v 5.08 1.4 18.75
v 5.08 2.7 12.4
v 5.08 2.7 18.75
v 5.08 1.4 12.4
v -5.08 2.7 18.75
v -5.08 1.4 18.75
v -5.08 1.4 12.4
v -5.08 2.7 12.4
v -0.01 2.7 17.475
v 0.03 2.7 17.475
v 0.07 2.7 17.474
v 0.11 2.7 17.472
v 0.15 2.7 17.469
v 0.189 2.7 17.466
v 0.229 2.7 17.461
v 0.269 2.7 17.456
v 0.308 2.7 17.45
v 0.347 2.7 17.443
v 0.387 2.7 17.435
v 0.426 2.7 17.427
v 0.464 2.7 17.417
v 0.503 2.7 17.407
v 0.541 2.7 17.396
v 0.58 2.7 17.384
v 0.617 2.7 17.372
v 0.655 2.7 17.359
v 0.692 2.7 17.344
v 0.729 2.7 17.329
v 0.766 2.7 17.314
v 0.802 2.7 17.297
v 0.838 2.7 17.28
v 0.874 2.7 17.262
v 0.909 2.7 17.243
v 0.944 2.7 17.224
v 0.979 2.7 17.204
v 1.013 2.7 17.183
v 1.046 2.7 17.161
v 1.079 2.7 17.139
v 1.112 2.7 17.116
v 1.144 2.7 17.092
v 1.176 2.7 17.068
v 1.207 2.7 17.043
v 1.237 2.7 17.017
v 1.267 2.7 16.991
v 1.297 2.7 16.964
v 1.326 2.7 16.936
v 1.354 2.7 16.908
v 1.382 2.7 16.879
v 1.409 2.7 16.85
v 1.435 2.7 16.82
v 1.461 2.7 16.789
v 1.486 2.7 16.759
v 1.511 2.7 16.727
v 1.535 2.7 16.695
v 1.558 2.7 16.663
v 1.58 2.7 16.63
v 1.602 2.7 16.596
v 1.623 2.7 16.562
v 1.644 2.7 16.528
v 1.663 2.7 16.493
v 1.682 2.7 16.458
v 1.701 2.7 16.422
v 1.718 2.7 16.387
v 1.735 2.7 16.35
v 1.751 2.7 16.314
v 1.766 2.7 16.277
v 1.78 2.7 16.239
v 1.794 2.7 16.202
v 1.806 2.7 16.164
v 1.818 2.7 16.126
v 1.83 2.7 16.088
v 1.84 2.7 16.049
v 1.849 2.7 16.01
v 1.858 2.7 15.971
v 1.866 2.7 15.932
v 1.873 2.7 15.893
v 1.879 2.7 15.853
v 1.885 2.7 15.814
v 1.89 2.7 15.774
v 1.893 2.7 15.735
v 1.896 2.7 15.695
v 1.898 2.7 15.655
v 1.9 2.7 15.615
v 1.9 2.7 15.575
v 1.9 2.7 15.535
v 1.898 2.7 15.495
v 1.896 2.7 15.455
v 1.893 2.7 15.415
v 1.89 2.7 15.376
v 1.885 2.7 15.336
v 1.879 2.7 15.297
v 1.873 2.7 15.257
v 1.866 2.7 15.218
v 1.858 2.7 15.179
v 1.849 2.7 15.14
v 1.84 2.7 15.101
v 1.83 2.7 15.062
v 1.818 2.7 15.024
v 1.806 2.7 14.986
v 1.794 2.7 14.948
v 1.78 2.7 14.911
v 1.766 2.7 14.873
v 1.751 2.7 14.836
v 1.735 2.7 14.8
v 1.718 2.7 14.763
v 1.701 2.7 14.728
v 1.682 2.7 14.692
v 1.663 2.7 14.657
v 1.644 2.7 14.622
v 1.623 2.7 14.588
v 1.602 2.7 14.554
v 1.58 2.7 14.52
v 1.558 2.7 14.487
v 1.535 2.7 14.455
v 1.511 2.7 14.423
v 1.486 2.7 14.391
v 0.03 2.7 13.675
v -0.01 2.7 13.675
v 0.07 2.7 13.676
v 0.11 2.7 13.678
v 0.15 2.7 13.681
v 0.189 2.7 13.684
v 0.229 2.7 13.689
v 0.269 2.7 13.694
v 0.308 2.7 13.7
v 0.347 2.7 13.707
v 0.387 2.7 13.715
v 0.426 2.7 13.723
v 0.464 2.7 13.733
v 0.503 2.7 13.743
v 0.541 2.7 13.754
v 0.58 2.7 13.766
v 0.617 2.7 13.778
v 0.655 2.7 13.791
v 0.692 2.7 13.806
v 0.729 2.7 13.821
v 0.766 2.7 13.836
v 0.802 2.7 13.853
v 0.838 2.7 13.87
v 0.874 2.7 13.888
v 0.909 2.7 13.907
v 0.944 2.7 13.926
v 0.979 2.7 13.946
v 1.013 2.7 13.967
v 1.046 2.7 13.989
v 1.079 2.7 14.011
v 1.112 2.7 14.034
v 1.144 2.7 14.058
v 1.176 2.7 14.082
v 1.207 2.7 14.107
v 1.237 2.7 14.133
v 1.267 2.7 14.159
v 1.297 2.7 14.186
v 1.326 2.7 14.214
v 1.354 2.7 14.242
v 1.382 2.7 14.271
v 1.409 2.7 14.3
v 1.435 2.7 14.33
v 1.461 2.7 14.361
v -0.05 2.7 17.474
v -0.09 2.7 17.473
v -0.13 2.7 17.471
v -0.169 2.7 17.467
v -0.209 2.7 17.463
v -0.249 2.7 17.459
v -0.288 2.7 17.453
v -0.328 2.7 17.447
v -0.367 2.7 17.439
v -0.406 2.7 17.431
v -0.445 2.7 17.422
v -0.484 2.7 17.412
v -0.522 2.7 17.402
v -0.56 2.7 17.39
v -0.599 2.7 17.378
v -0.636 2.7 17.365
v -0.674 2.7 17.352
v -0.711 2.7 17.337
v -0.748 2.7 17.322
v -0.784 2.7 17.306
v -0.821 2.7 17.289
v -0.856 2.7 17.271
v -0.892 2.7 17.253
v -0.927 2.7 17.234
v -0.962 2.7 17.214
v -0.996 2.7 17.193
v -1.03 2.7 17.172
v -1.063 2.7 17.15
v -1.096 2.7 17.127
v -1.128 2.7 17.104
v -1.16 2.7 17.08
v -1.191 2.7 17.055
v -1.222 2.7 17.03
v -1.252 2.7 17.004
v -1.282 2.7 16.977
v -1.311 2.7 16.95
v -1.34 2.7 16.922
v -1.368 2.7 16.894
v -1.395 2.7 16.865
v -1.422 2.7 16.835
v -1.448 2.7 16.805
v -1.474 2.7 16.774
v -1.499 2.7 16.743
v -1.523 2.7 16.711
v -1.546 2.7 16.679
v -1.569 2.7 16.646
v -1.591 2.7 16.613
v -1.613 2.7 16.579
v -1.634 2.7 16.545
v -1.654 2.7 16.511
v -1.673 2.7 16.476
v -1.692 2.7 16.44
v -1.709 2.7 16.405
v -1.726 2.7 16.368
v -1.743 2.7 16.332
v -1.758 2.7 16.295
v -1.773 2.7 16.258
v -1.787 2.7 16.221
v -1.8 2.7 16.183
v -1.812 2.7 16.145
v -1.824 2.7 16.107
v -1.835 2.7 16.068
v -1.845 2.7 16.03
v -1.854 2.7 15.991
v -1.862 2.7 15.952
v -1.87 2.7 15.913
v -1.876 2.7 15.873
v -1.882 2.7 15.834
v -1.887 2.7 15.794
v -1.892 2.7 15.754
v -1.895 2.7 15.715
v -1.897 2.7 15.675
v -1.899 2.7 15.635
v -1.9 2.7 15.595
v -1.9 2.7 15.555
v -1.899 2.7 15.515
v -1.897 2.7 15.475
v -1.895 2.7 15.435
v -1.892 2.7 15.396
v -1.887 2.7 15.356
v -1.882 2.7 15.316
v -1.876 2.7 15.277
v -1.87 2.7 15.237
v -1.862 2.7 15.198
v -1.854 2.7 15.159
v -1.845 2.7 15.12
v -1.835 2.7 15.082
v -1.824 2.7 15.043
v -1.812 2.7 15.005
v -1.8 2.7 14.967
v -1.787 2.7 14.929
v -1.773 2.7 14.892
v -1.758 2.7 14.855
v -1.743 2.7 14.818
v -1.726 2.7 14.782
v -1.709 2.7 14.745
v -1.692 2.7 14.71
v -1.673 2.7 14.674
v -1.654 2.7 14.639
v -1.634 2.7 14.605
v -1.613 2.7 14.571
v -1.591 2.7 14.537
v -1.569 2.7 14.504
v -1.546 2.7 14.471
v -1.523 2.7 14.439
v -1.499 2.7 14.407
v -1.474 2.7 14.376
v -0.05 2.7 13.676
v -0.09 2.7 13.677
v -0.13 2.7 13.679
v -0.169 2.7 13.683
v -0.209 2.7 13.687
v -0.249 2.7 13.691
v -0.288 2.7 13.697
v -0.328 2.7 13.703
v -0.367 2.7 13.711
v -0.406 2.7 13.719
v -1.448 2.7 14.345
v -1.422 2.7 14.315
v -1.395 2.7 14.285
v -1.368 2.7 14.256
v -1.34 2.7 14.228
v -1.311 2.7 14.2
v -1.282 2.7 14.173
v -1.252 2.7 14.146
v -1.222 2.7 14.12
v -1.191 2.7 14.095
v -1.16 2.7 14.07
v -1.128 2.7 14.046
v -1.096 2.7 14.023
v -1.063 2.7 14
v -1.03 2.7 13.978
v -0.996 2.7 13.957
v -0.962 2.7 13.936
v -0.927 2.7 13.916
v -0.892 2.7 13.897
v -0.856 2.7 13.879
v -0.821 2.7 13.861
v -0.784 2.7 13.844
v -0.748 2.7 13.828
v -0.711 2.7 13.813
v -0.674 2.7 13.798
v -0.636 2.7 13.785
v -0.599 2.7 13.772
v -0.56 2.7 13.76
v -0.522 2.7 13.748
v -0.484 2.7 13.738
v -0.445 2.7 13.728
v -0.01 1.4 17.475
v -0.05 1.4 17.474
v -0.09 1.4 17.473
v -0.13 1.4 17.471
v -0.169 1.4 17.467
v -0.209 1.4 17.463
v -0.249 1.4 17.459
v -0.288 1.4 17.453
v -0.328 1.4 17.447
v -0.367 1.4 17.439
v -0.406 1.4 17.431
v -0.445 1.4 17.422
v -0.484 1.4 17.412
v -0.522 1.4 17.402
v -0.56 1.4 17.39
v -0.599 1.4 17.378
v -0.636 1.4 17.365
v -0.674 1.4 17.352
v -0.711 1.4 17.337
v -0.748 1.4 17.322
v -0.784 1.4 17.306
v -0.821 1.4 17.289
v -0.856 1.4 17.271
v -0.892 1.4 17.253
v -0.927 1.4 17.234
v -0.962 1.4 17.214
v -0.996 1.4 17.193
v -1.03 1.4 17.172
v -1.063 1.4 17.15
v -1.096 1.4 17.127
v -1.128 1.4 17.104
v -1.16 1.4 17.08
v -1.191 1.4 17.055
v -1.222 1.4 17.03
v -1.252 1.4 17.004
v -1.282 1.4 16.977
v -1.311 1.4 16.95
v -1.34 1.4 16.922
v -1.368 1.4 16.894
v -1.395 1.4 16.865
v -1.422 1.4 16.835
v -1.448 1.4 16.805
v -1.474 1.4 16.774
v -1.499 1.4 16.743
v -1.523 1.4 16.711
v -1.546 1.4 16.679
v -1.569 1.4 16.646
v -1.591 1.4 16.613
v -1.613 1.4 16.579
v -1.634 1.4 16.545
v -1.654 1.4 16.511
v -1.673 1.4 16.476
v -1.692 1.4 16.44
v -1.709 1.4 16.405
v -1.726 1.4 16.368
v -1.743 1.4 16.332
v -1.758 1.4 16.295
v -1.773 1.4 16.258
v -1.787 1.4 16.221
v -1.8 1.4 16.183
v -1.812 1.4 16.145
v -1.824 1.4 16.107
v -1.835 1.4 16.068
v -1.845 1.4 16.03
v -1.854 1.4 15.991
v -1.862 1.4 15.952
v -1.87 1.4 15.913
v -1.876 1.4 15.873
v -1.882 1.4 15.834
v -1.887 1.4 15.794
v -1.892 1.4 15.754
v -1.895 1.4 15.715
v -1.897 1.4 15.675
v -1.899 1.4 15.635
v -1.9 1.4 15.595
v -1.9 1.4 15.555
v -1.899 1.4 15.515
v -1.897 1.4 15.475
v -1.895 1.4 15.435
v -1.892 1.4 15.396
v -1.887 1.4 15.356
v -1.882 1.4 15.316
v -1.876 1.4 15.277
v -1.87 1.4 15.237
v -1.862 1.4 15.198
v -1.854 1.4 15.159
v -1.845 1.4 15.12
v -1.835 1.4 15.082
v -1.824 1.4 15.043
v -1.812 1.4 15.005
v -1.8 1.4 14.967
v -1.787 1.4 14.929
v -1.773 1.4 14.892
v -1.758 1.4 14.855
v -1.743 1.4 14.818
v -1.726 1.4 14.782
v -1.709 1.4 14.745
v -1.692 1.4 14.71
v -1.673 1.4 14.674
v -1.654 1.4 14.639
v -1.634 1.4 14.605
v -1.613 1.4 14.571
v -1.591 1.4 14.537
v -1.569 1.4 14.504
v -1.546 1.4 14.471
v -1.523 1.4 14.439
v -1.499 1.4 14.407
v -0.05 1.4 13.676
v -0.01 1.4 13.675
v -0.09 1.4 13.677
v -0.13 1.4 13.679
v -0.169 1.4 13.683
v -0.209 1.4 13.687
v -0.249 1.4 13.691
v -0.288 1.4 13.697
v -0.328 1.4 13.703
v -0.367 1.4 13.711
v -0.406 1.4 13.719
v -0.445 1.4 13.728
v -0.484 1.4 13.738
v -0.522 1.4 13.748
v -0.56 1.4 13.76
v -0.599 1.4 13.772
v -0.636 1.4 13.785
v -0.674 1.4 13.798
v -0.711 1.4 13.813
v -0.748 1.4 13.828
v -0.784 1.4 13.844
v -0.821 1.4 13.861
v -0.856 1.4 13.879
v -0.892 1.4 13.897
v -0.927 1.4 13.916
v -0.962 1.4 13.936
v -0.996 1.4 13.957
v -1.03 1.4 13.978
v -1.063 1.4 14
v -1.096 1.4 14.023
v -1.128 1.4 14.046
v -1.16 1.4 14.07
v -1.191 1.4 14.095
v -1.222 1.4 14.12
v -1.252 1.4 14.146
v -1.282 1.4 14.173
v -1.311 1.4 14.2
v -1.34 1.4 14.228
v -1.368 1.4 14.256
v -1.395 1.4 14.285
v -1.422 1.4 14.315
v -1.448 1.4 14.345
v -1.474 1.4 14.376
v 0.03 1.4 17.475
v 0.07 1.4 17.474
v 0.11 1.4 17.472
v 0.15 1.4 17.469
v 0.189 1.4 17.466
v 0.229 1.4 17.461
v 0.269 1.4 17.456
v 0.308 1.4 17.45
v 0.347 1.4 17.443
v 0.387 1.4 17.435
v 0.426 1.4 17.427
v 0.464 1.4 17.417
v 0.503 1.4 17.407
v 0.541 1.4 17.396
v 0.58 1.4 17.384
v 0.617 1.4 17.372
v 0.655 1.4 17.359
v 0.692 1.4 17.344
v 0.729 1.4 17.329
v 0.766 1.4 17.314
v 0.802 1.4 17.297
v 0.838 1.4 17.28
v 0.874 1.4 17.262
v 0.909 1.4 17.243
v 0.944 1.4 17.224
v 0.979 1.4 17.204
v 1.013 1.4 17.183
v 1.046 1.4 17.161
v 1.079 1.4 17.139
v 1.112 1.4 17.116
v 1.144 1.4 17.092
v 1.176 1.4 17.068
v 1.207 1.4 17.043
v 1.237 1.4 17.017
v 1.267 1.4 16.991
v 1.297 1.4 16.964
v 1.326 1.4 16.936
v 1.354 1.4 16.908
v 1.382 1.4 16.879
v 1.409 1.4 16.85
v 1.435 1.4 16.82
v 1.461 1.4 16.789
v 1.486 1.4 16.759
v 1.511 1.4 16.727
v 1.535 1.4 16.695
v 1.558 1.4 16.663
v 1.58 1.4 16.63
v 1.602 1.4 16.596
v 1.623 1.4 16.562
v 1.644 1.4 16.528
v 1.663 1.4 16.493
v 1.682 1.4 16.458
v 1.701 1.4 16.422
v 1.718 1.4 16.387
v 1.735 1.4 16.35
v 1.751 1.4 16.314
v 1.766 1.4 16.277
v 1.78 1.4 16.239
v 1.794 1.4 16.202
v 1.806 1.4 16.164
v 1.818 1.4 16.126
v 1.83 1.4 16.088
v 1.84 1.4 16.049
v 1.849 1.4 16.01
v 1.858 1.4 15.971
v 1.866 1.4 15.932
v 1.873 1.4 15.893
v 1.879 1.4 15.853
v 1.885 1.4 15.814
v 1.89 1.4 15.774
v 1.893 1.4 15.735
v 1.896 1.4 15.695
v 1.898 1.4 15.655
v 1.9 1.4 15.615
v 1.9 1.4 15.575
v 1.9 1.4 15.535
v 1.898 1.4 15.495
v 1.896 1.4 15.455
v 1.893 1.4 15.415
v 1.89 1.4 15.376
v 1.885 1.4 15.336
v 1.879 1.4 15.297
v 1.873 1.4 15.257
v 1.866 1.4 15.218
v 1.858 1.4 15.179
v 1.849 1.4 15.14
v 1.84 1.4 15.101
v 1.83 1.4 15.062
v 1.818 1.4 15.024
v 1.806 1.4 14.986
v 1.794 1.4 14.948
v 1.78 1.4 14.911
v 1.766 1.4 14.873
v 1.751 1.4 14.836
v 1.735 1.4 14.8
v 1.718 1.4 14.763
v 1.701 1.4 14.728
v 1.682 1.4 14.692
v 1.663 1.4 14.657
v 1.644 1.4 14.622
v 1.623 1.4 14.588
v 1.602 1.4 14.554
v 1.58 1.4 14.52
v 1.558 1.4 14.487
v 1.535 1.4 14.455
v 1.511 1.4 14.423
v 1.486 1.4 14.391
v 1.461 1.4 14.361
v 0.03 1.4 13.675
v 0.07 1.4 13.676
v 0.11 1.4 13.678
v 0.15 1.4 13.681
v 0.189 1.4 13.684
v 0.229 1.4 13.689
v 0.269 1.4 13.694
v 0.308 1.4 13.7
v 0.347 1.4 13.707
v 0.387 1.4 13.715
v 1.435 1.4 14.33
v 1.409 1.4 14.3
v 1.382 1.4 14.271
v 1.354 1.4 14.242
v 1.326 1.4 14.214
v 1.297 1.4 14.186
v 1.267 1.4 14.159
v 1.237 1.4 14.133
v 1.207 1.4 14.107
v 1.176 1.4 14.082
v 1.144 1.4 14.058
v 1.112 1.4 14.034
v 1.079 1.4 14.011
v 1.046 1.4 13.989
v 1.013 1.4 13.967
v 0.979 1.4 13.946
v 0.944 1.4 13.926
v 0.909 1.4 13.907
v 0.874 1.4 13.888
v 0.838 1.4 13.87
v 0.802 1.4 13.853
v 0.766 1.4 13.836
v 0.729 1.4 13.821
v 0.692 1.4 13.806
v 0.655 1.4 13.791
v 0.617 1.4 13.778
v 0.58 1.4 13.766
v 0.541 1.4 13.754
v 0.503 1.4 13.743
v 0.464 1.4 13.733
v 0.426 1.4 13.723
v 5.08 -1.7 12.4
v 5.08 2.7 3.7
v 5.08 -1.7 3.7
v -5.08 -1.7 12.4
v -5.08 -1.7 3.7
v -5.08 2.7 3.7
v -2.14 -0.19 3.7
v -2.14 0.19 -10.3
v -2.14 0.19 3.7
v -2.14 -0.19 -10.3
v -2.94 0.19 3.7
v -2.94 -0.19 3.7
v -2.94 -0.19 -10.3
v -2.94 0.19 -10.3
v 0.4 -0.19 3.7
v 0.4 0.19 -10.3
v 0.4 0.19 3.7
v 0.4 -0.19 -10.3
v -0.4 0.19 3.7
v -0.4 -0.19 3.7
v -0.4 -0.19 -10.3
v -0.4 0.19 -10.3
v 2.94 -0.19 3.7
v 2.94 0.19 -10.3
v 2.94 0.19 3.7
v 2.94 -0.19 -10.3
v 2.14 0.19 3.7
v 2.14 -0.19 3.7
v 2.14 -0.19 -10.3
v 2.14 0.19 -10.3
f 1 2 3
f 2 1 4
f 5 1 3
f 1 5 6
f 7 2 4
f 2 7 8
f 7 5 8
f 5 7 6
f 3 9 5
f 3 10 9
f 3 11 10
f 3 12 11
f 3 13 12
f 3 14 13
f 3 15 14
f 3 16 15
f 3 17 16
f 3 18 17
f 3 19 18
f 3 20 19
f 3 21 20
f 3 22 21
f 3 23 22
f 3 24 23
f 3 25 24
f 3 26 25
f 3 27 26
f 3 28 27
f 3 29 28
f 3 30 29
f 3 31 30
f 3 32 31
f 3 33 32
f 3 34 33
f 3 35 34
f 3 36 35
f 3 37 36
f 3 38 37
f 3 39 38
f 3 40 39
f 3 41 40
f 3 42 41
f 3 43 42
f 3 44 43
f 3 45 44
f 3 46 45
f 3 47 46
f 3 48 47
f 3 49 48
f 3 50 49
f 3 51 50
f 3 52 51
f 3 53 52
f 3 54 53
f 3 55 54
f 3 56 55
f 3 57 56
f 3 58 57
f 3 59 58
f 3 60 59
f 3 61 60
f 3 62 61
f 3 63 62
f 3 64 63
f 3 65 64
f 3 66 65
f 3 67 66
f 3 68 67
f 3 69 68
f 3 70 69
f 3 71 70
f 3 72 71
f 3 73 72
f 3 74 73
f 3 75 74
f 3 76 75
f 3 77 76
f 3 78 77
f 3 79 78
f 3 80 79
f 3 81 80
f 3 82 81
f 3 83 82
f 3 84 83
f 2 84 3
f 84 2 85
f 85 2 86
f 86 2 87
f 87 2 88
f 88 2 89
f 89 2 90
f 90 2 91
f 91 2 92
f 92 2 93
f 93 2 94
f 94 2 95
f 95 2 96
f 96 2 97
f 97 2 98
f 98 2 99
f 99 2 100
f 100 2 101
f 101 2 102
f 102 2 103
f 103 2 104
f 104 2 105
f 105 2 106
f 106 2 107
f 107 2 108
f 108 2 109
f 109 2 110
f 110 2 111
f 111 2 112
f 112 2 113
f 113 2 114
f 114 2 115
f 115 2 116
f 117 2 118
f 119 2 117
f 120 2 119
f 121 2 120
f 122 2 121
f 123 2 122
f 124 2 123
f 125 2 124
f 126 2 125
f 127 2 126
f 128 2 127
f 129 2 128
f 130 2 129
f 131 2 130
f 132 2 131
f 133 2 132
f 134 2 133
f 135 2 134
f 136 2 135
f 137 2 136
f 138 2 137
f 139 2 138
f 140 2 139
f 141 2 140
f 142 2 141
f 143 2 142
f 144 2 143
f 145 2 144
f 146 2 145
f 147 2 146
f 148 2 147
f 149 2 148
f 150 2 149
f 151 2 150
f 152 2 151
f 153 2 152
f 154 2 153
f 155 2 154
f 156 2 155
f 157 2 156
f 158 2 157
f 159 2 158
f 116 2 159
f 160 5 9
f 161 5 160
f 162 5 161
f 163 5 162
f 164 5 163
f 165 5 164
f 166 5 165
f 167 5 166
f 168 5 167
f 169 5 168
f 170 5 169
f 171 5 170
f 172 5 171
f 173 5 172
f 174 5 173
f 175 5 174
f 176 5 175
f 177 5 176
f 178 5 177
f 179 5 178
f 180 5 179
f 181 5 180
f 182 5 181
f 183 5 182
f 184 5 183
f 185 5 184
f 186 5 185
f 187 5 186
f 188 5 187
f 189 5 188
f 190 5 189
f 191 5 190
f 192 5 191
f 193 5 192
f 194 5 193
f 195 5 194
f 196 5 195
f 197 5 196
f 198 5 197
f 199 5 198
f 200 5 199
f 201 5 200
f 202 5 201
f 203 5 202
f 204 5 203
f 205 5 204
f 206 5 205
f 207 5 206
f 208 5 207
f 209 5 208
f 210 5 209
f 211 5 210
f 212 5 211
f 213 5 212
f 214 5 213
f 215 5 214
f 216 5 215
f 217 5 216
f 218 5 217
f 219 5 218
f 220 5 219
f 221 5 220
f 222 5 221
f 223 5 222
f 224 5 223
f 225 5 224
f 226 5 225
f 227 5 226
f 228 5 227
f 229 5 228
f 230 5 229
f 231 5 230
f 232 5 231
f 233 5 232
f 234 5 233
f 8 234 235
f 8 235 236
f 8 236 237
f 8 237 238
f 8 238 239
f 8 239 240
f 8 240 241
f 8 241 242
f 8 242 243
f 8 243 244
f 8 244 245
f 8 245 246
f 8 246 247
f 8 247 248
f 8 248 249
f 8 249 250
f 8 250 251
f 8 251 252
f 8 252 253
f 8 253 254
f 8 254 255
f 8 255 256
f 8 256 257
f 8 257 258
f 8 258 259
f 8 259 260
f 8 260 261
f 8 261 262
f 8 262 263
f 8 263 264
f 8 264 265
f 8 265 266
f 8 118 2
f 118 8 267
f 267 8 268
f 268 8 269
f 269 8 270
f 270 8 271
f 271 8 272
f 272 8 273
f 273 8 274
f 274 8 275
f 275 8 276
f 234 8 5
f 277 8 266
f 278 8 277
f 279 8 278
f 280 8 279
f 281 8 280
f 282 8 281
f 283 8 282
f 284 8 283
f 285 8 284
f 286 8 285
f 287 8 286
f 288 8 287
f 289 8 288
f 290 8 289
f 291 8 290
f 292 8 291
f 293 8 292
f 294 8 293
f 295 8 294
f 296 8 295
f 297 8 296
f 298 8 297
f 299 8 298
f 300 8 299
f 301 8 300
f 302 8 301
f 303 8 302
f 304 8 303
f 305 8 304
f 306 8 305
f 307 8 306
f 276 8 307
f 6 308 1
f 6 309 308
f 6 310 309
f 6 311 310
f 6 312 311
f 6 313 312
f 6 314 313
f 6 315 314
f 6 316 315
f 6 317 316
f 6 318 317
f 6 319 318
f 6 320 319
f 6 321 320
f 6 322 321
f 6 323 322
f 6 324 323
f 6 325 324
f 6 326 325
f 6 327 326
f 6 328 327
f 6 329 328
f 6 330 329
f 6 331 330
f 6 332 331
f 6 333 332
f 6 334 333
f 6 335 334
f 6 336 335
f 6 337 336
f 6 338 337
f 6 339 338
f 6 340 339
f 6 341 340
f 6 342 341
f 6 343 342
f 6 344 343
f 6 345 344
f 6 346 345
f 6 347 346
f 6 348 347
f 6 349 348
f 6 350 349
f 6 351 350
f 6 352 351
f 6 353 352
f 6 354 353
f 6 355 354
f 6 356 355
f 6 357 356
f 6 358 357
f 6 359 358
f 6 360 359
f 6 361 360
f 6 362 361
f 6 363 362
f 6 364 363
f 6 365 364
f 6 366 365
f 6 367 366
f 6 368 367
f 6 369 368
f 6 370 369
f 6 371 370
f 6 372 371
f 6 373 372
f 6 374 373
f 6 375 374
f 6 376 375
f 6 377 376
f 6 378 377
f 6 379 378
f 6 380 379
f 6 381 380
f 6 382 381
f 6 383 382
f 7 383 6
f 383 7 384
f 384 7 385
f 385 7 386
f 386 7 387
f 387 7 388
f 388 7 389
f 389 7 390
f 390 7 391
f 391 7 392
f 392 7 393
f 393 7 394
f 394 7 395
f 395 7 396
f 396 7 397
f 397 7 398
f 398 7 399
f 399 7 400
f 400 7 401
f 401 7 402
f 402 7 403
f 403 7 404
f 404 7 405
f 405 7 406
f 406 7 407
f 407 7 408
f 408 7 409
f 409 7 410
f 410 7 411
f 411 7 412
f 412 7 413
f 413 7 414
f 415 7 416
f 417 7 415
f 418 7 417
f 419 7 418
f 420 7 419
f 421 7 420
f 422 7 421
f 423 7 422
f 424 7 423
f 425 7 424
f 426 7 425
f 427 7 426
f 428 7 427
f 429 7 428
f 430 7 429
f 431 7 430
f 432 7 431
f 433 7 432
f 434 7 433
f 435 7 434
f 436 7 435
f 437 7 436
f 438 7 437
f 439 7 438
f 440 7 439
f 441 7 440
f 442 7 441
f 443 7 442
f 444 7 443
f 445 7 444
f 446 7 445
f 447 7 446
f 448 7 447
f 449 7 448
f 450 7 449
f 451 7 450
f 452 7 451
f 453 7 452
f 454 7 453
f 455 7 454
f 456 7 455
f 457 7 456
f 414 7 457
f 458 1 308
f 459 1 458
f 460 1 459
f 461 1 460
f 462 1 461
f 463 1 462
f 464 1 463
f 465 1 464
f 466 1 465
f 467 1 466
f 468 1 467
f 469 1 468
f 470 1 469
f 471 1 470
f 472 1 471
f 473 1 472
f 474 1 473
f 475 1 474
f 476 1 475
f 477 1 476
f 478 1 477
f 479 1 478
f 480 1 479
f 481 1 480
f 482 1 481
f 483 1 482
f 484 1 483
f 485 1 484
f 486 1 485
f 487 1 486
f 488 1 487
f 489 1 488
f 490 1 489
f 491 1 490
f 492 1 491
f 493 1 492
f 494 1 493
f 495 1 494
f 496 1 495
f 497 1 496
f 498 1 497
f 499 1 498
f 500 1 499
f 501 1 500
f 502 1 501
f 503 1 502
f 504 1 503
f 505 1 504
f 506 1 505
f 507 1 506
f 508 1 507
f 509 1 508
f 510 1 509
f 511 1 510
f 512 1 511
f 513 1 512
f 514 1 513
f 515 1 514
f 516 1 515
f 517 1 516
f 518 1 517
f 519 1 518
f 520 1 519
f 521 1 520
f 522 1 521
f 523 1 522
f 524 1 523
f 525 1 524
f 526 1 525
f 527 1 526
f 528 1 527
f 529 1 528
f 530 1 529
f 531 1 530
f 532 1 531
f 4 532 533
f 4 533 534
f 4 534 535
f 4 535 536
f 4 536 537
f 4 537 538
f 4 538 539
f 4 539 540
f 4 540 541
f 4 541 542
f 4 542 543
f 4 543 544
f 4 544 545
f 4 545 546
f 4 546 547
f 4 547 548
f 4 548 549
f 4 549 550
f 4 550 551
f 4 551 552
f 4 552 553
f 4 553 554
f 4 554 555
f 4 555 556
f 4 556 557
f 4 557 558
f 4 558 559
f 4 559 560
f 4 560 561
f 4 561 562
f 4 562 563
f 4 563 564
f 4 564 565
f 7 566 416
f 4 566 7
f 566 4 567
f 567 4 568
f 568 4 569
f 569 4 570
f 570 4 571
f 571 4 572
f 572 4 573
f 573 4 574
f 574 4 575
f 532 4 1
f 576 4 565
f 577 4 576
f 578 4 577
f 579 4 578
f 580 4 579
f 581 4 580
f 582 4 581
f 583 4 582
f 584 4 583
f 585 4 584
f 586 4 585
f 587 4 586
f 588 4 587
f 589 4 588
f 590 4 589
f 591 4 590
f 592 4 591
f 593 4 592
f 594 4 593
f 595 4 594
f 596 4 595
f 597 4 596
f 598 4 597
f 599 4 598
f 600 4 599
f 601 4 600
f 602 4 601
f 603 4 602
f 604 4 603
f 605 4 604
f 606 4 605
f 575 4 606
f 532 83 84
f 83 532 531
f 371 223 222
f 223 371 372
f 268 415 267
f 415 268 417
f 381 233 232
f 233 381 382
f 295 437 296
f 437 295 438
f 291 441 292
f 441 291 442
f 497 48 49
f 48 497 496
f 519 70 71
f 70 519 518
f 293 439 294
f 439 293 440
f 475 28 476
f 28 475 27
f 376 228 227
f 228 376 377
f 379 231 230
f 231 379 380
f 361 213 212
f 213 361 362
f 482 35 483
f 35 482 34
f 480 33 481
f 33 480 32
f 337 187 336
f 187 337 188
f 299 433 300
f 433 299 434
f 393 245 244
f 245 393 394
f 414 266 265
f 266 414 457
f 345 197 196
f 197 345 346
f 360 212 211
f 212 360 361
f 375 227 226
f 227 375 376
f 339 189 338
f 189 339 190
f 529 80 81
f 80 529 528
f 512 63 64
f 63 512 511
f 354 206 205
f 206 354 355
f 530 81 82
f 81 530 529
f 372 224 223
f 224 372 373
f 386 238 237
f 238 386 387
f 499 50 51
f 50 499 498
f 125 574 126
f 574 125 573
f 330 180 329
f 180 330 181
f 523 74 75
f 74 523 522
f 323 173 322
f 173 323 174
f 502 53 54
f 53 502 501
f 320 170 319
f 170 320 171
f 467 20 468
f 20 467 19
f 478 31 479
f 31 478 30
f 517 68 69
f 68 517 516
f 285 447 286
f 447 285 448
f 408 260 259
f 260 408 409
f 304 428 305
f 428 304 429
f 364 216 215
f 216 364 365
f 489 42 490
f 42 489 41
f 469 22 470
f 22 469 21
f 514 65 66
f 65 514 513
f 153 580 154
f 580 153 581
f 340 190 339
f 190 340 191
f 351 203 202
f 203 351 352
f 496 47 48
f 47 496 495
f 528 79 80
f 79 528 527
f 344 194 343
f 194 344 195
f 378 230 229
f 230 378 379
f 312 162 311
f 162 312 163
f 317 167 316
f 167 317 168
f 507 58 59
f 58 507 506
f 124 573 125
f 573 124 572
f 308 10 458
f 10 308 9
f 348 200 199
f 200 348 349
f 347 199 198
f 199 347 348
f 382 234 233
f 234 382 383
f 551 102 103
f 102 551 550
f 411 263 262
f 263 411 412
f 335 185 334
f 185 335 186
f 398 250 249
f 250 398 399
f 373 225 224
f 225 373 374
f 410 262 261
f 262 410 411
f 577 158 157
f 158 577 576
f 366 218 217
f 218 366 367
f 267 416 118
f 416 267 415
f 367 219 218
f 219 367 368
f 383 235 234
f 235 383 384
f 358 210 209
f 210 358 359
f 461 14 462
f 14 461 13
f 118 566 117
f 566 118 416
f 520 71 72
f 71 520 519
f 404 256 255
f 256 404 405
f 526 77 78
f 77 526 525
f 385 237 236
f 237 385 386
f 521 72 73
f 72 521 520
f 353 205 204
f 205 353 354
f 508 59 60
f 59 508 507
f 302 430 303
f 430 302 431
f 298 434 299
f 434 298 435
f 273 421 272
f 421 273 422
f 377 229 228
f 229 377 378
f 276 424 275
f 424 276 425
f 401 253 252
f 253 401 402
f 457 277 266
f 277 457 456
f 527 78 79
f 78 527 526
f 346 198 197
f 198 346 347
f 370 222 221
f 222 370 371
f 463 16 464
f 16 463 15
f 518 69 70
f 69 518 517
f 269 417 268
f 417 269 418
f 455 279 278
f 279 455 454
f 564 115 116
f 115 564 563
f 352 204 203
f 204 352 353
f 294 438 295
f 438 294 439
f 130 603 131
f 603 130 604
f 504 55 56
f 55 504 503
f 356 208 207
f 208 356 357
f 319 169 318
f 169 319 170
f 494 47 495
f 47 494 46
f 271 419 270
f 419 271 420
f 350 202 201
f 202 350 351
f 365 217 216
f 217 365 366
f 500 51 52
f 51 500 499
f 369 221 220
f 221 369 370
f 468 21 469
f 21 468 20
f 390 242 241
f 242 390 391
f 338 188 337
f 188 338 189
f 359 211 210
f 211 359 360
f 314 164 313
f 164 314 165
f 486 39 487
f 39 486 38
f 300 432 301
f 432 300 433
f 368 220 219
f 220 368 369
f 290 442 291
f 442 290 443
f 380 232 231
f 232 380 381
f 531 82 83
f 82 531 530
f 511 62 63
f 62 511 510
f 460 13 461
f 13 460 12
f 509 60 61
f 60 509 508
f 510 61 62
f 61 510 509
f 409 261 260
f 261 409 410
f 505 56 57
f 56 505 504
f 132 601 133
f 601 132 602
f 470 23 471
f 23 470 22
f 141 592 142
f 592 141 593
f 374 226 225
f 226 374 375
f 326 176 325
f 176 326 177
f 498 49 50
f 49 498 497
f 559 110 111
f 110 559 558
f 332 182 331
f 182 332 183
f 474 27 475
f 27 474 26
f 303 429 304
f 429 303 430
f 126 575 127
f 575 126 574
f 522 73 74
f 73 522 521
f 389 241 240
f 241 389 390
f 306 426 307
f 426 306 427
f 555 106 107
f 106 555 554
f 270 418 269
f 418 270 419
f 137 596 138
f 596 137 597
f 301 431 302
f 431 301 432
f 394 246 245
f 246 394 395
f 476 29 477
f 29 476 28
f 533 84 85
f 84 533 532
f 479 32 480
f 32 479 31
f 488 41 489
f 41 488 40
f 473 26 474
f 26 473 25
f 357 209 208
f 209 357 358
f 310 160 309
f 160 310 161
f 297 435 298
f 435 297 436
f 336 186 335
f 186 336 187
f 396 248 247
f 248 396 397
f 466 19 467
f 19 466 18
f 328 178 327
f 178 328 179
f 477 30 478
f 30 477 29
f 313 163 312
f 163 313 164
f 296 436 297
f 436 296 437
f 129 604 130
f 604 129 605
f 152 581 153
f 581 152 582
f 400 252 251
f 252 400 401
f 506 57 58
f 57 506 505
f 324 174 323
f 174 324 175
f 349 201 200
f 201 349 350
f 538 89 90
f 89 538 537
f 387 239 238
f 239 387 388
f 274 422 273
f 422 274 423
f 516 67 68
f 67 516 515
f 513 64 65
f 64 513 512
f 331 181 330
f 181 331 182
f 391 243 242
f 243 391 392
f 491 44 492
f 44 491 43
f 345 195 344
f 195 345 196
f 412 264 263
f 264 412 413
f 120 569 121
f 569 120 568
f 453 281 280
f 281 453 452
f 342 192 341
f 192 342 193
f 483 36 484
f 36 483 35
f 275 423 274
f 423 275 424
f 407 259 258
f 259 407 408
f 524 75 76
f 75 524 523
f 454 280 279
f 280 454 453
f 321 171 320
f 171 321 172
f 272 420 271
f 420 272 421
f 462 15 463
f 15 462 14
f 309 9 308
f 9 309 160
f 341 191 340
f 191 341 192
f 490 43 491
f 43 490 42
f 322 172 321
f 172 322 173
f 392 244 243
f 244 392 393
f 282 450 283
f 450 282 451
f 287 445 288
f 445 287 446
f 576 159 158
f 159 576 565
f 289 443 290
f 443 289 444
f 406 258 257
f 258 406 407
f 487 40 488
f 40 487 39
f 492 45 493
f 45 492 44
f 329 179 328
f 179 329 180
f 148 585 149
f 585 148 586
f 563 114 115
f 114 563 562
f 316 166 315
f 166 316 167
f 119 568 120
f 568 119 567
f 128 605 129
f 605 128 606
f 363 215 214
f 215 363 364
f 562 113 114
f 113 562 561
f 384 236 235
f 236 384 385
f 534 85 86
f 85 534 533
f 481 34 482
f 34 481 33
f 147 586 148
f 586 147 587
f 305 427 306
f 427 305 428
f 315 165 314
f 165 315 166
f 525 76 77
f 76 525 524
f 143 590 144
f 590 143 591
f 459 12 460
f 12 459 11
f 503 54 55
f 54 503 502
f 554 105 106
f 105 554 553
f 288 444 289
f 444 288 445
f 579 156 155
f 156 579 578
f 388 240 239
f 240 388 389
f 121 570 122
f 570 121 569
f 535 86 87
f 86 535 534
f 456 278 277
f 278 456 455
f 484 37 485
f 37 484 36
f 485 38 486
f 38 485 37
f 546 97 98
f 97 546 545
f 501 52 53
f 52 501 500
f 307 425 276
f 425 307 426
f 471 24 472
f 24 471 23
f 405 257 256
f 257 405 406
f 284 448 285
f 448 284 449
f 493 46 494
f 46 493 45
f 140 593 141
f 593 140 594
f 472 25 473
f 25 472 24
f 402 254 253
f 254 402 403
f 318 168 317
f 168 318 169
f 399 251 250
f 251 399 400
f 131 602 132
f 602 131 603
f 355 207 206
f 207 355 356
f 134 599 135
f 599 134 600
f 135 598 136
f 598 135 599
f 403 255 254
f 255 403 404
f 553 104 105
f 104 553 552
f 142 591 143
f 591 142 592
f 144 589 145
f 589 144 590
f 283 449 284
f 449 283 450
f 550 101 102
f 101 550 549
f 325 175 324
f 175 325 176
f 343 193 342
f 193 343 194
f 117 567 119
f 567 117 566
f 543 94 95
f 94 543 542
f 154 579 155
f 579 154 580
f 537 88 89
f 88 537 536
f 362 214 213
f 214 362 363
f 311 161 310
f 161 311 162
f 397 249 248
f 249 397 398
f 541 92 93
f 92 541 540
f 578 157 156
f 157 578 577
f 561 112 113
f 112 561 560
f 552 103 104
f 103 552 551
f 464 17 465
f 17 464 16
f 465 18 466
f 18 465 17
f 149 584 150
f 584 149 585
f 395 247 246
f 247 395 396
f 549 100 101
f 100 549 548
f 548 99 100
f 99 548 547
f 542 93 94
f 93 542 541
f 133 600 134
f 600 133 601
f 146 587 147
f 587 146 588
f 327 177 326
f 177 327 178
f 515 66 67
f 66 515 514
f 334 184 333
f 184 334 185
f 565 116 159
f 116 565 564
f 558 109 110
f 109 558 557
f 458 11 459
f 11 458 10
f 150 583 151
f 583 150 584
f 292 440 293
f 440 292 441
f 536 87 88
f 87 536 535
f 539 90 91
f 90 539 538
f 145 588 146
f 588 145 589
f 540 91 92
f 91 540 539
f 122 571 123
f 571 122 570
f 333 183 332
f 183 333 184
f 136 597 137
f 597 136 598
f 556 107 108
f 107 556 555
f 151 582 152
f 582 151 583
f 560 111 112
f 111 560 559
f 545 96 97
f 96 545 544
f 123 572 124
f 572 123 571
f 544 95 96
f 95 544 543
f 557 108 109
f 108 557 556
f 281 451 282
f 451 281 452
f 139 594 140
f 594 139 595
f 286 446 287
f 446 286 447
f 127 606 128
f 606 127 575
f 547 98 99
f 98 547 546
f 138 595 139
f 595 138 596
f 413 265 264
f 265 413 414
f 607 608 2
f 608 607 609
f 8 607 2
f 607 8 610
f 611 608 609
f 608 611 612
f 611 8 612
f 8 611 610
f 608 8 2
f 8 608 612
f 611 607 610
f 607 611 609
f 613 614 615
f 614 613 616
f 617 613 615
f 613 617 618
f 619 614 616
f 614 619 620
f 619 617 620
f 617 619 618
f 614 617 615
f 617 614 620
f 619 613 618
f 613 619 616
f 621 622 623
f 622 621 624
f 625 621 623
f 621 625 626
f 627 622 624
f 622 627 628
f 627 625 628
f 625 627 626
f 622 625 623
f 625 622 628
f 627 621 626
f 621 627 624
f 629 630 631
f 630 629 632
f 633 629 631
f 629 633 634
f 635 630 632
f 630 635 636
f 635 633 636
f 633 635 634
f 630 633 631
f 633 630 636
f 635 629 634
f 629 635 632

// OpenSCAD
$fa = 1;
$fs = 0.04;

body_color = [0.1,0.1,0.1];
body_width = 10.16;
body_depth = 4.4;
body_height = 8.7;

offset_y = -1.7;
offset_z = 3.7;

dissipator_color = [0.8,0.8,0.8];
dissipator_depth = 1.3;
dissipator_height = 6.35;
dissipator_hole_radius = 1.9;

pin_color = [0.9,0.9,0.9];
pin_count = 3;
pin_width = 0.8;
pin_depth = 0.38;
pin_height = 14;
pin_inter_distance = 2.54;

module pin() {
    color(pin_color)
        translate([-pin_width/2,-pin_depth/2,-pin_height])
            cube([pin_width, pin_depth, pin_height]);

}

module dissipator() {
    difference() {
        color(dissipator_color)
            cube([body_width,dissipator_depth,dissipator_height]);

        translate([body_width/2,-dissipator_depth,dissipator_height/2])
            rotate([-90,0,0])
                color(dissipator_color)
                    linear_extrude(height = dissipator_depth*3)
                        circle(dissipator_hole_radius);
    }
}

translate([-body_width/2,offset_y,offset_z]) {
    color(body_color)
        cube([body_width,body_depth,body_height]);

    translate([0,body_depth-dissipator_depth,body_height])
        dissipator();
}

for(i=[0:1:pin_count-1]) {
    translate([pin_inter_distance * (i - (pin_count-1)/2),0,offset_z])
        pin();
}
